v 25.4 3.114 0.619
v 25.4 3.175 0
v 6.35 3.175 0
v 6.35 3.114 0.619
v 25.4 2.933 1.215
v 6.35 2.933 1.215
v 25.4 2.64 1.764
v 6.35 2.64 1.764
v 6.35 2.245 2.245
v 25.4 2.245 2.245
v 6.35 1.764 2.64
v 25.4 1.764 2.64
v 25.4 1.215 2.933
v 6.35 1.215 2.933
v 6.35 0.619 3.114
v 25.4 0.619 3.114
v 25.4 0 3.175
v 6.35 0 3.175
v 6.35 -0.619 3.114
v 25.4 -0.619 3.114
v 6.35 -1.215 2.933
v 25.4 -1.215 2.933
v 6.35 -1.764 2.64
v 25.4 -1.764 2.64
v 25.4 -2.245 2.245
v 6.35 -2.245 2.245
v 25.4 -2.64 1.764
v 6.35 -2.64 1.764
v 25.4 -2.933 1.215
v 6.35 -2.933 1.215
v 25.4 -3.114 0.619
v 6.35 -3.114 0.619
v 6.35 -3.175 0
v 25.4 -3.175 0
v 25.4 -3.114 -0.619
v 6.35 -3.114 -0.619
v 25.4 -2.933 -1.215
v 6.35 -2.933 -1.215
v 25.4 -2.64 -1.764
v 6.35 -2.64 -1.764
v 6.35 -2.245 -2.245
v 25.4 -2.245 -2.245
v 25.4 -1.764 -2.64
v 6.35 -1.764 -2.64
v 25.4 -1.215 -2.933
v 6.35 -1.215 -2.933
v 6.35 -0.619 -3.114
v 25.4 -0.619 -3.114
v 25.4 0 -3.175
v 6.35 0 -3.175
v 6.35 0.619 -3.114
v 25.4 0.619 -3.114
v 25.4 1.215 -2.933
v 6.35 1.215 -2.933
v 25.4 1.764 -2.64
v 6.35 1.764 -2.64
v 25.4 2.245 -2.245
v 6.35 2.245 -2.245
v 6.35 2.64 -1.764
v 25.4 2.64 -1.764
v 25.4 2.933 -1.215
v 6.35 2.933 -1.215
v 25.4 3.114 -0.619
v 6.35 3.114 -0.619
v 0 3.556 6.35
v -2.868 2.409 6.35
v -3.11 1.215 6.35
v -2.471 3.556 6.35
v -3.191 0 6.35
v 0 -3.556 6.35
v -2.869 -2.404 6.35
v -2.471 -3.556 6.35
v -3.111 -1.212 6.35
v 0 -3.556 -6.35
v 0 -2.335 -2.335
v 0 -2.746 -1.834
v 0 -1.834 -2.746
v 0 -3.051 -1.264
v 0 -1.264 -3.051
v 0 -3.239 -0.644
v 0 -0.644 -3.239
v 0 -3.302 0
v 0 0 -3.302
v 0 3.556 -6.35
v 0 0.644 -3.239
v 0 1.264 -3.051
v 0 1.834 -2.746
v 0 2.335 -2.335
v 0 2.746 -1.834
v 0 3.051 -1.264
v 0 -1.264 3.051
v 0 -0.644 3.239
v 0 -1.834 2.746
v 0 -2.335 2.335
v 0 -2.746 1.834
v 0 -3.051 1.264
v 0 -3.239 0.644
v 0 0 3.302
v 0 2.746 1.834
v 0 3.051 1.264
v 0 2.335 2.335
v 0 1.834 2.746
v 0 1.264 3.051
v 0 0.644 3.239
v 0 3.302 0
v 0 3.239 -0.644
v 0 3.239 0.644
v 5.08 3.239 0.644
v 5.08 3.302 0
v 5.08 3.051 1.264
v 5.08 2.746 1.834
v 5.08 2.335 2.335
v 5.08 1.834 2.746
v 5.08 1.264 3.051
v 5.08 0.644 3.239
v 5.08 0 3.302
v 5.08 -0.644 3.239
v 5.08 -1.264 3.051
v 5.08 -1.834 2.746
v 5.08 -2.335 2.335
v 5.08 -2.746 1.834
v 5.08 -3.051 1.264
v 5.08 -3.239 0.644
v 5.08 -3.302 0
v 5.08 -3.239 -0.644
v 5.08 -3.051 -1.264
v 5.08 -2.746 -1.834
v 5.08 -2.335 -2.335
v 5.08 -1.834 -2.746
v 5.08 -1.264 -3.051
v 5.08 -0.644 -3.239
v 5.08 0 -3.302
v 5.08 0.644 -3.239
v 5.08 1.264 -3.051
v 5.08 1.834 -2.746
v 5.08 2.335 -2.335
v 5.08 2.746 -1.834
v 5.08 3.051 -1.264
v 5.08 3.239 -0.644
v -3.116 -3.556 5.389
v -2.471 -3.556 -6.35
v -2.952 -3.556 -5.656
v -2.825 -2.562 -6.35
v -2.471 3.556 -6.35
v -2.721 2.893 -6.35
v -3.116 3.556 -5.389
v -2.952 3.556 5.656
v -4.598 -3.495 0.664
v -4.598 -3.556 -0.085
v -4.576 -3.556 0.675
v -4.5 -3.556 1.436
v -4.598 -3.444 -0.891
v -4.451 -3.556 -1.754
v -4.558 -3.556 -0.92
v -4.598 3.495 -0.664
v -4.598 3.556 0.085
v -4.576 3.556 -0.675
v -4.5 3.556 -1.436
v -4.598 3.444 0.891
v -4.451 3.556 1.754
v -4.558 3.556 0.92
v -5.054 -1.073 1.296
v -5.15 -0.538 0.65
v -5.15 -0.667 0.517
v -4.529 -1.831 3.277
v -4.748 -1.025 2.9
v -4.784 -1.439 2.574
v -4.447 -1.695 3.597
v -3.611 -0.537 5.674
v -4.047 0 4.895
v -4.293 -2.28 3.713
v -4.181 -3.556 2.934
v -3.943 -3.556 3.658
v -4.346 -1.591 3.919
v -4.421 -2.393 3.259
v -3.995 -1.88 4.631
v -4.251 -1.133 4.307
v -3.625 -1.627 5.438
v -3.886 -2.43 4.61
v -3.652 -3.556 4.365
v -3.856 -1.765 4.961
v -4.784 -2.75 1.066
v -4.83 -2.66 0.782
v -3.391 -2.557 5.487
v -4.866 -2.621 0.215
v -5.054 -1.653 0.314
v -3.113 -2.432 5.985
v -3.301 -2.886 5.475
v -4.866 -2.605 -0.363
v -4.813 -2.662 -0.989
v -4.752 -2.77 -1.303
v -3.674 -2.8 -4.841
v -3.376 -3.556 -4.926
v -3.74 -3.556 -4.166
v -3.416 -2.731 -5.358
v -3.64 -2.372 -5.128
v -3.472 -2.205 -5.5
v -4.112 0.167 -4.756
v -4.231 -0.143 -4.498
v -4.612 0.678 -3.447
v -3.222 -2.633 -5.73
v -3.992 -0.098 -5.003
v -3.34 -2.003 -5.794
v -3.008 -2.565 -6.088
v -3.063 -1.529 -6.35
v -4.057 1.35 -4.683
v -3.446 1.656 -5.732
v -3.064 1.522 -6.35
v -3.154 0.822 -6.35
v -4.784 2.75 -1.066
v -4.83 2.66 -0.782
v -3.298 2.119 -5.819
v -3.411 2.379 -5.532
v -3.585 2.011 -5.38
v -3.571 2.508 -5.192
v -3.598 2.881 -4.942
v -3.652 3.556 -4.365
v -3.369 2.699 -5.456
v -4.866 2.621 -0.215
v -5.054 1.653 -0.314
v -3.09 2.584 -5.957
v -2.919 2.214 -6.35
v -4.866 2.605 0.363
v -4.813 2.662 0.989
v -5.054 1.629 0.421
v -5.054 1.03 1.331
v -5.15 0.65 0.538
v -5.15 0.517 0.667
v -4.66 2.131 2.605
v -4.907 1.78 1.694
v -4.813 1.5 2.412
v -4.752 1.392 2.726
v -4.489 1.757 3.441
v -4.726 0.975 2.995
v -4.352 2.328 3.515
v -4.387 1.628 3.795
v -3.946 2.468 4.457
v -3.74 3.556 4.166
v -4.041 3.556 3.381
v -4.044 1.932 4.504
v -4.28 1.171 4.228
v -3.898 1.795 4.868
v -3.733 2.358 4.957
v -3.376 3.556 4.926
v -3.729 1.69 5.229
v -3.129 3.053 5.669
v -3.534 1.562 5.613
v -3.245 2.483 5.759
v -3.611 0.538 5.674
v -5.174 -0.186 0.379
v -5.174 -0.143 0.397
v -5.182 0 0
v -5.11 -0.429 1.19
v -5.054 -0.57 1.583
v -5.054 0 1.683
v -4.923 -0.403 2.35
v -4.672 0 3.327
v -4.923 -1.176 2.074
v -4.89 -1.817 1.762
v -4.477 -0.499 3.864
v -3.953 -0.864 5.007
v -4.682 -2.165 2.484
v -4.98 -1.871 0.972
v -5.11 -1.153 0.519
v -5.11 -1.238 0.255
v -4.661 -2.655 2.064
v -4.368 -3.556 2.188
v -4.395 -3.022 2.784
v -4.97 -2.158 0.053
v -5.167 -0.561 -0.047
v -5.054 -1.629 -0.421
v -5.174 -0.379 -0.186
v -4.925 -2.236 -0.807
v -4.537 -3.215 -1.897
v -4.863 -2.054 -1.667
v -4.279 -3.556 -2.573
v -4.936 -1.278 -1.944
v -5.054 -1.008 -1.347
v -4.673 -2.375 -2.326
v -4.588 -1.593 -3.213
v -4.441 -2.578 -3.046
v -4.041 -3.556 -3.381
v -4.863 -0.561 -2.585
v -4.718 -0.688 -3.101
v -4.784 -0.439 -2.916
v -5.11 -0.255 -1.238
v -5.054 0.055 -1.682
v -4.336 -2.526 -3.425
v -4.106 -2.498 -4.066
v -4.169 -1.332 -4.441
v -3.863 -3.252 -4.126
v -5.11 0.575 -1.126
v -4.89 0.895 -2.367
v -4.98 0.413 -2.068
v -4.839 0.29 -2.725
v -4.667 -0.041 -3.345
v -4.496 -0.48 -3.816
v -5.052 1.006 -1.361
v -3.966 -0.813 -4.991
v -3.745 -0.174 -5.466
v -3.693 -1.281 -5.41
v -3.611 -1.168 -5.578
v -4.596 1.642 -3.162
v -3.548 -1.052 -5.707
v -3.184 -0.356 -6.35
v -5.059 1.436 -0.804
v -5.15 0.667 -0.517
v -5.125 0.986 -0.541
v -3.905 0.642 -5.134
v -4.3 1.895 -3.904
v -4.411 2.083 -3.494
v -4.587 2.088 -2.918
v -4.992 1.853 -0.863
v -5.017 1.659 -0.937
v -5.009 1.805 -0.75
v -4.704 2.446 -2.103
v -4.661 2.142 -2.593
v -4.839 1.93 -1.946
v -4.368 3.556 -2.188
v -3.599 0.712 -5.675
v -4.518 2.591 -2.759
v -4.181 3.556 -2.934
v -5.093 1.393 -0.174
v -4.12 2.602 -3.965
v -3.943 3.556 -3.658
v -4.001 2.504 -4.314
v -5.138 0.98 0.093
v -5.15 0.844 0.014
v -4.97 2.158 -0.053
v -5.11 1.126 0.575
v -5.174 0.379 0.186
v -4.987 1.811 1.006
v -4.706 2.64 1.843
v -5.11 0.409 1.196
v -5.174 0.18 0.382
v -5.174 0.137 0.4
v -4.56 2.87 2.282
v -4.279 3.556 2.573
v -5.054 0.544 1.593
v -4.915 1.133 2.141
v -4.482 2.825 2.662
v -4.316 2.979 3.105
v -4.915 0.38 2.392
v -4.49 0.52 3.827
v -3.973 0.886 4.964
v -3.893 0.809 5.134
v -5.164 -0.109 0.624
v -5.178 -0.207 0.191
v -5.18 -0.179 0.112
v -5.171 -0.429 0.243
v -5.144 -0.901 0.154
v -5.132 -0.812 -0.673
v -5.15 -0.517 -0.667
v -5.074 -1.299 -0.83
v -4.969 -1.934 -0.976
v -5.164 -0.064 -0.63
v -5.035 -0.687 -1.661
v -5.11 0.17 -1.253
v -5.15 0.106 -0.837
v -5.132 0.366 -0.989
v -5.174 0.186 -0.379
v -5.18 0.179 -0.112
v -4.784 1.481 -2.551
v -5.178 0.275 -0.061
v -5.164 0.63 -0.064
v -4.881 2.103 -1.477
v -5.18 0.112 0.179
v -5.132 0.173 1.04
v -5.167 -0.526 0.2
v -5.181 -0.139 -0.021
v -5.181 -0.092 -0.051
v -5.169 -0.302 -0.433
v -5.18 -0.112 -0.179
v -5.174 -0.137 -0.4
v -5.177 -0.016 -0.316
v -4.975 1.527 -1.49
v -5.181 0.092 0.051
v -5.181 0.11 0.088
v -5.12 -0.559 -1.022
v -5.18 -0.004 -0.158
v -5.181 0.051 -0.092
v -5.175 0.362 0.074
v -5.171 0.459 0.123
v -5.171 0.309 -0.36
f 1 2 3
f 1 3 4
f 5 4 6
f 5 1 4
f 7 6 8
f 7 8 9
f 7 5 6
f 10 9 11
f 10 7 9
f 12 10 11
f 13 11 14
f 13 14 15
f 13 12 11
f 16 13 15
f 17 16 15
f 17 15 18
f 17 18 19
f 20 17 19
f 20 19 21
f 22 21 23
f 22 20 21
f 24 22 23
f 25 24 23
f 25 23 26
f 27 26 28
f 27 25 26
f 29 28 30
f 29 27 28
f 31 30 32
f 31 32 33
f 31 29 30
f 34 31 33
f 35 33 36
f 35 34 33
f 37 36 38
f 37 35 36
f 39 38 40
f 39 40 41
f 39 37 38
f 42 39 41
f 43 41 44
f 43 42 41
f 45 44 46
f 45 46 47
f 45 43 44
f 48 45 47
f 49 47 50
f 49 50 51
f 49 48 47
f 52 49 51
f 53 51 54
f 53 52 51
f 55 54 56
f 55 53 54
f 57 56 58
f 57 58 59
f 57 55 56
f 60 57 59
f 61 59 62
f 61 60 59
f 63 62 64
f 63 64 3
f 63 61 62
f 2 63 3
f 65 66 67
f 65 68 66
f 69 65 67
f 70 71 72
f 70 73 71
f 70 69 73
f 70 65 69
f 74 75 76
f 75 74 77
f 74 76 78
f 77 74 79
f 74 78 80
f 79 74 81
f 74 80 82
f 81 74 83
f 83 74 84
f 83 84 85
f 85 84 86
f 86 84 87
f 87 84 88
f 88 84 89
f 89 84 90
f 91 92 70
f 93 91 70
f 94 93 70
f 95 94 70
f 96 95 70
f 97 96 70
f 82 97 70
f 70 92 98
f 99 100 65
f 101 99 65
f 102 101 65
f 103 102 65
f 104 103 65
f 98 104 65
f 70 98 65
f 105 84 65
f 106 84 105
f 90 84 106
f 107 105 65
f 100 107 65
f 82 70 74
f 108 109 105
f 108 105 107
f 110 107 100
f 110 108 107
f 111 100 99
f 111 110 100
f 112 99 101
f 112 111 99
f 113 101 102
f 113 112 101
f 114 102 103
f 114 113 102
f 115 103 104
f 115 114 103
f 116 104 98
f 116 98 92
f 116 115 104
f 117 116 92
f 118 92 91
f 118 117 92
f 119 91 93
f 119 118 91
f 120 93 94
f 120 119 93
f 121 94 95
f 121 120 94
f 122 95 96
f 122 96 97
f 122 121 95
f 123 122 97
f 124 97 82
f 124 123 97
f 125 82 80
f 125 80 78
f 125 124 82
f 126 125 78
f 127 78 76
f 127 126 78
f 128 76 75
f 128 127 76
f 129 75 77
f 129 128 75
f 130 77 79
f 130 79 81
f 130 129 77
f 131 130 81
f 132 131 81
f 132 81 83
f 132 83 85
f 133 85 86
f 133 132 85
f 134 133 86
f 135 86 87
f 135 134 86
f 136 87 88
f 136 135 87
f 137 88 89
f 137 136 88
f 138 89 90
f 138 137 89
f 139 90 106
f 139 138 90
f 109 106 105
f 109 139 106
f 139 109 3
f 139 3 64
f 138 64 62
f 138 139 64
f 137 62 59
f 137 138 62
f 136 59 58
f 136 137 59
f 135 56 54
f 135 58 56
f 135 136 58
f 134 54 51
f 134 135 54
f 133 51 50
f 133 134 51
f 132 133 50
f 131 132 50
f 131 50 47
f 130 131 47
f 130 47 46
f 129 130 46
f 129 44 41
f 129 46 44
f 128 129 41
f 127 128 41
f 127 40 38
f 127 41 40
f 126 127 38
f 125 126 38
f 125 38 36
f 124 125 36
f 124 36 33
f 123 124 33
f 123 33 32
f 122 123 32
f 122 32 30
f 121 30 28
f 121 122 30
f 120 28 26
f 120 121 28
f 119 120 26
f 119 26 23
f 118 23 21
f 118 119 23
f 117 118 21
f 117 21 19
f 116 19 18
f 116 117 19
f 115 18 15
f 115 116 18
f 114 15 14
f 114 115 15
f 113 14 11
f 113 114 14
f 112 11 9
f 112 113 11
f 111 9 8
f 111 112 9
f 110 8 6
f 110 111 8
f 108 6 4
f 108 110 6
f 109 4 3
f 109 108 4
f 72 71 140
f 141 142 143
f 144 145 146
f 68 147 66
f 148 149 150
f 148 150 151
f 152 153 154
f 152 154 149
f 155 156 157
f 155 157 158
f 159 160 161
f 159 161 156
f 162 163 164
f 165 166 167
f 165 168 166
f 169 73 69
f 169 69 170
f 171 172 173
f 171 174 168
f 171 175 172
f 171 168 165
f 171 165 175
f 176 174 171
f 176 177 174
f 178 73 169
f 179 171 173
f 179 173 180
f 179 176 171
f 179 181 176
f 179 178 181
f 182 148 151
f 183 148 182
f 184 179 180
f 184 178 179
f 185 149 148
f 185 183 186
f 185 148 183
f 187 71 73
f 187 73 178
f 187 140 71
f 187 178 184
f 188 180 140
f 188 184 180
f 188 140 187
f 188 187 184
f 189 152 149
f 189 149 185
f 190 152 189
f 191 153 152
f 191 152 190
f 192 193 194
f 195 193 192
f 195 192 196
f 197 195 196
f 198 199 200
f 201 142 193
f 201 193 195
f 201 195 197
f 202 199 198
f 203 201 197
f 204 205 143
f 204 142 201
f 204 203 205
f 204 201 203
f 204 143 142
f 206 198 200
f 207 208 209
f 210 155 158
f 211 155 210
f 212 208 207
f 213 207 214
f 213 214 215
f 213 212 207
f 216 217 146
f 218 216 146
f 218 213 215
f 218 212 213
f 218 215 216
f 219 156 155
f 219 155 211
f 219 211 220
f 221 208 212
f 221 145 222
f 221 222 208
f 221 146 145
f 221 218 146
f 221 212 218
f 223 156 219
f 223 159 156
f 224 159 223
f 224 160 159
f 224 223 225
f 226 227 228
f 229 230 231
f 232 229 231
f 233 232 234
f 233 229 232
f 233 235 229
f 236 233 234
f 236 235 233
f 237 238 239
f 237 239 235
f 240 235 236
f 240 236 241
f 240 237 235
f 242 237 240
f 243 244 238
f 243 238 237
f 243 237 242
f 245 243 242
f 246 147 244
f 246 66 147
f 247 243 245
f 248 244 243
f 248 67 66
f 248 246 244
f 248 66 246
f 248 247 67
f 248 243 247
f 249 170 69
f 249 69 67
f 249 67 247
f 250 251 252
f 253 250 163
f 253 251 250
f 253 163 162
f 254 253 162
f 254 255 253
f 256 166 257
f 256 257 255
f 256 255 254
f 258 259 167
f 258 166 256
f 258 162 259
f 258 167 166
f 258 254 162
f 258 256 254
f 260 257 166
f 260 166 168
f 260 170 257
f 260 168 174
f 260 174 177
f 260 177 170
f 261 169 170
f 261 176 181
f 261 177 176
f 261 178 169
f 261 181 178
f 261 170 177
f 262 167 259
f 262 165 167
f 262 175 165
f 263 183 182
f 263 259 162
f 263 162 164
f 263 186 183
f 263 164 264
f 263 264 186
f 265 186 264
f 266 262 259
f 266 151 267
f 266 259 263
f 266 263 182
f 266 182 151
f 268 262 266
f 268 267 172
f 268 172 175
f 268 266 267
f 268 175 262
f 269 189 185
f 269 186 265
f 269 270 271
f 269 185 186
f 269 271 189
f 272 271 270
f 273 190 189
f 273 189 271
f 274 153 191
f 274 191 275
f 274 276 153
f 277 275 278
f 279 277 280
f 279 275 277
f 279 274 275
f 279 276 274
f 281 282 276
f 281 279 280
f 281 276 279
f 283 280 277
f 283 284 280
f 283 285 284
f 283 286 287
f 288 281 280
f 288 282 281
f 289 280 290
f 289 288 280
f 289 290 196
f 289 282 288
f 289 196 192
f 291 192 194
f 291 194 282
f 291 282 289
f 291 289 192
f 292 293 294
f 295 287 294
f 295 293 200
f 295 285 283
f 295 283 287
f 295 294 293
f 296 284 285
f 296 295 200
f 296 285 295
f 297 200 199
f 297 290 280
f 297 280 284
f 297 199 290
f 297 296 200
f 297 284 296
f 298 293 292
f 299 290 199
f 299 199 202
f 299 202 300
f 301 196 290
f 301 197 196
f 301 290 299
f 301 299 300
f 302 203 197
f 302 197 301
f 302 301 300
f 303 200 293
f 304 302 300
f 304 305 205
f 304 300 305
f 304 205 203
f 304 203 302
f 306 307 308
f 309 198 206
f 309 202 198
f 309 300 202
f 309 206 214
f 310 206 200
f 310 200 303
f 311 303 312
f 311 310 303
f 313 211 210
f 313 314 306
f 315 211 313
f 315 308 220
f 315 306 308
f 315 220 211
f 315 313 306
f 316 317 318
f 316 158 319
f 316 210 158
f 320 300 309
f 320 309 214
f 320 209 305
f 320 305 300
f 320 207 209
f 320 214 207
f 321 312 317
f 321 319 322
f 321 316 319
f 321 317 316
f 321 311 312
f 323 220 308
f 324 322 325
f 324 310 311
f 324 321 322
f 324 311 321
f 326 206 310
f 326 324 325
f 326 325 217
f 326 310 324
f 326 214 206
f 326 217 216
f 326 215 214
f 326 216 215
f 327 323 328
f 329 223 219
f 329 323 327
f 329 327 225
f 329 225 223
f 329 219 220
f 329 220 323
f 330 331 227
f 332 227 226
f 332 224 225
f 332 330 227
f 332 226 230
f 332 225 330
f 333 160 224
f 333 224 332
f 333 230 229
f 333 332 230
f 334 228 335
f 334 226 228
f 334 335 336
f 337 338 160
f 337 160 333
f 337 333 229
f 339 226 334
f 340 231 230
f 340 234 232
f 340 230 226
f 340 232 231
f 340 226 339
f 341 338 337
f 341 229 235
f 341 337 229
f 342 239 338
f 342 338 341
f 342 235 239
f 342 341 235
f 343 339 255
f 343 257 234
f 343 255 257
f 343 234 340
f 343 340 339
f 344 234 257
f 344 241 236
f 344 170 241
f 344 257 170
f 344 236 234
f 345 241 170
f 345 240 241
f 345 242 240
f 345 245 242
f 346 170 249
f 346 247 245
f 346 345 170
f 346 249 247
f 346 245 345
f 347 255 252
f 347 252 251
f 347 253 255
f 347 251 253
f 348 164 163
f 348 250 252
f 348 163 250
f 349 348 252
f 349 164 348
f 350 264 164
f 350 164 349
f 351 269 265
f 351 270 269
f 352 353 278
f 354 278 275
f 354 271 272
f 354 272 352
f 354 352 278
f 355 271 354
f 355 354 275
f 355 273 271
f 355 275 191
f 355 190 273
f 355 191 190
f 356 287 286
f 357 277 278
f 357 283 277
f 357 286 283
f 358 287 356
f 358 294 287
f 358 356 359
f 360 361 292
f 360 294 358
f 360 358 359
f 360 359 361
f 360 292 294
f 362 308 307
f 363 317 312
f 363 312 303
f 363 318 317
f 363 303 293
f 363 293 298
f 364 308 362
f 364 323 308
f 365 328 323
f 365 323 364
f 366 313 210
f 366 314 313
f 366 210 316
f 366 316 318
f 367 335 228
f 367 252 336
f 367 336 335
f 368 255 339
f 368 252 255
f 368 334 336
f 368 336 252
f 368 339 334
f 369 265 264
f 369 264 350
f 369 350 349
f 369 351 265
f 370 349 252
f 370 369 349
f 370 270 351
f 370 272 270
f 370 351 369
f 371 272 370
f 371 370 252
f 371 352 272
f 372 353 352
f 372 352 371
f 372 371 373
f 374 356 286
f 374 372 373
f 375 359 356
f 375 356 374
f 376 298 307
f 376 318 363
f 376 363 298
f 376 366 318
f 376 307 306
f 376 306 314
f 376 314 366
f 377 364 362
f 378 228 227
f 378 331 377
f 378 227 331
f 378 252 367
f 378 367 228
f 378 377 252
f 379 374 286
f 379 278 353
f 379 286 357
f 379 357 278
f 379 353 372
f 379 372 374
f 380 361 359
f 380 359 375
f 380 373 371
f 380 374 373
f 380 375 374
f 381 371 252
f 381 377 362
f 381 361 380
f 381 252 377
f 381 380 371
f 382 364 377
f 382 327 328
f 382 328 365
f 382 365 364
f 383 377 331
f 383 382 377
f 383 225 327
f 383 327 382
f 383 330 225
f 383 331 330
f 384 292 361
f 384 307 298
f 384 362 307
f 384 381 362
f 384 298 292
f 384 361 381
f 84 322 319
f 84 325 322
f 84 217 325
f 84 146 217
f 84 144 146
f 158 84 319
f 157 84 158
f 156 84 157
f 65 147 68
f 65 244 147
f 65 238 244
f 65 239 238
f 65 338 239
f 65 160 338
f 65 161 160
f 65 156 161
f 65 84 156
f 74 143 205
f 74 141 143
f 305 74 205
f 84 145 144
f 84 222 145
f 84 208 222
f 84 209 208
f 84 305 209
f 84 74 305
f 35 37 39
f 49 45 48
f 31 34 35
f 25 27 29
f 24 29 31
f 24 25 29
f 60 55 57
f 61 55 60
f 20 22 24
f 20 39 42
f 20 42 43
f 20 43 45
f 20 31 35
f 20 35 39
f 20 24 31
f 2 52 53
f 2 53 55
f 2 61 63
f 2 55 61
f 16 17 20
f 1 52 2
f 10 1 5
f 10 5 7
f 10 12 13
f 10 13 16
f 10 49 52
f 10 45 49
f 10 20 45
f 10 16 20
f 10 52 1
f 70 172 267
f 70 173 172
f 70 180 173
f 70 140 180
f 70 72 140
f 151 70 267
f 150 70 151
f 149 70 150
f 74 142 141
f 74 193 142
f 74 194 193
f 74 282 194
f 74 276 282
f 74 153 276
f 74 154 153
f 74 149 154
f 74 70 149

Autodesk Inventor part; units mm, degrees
ref_plane "YZ Plane" through (0, 0, 0) normal (1, 0, 0) x (0, 1, 0)
sketch "Boceto1" plane through (0, 0, 0) normal (0, 0, 1) x (1, 0, 0)
  line L0 (0, 3.302) -> (5.08, 3.302)
  line L1 (5.08, 3.302) -> (6.35, 3.175)
  line L2 (6.35, 3.175) -> (25.4, 3.175)
  line L3 (25.4, 3.175) -> (25.4, 2.4879)
  line L4 (25.4, 2.4879) -> (25.4, 0)
  line L5 (0, 3.9624) -> (0, -0.6604) projected
  line L6 (0, 3.302) -> (0, 0)
  line L7 (-0.4343, 0) -> (7.5114, 0)
  line L8 (-5.6012, 0) -> (30.5669, 0) projected
  line L9 (0, 0) -> (25.4, 0)
  dimension "d0" = 0
  dimension "d1" = 19.05
  dimension "d2" = 1.27
  dimension "d3" = 4.9759
  dimension "d4" = 6.35
  dimension "d5" = 6.604
  dimension "d6" = 25.4
revolve "Cuerpo" add sketch "Boceto1" angle 360 about axis through (-0.4343, 0, 0) along (1, 0, 0)
sketch "Boceto2" plane through (0, 0, 0) normal (-1, 0, 0) x (0, 0, 1)
  line L0 (-6.35, 3.556) -> (6.35, 3.556)
  line L1 (6.35, 3.556) -> (6.35, -3.556)
  line L2 (6.35, -3.556) -> (-6.35, -3.556)
  line L3 (-6.35, -3.556) -> (-6.35, 3.556)
  line L4 (-8.89, 0) -> (8.89, 0) projected
  line L5 (0, 4.9784) -> (0, -4.9784) projected
  dimension "d7" = 3.556
  dimension "d8" = 7.112
  dimension "d9" = 6.35
  dimension "d10" = 12.7
extrude "Cabeza" add sketch "Boceto2" along normal blind 5.1816
ref_plane "IDS_WORKPLANE{1}" through (0, 0, 0) normal (0, 1, 0) x (-1, 0, 0)
sketch "Boceto3" plane through (0, 0, 0) normal (0, 1, 0) x (-1, 0, 0)
  arc A0 (5.1816, 0) -> (-0.1952, 9.525) centre (-5.9436, 0) ccw
  line L0 (0, -9.6663) -> (0, 13.5477) projected
  line L1 (8.9083, 0) -> (-8.4189, 0) projected
  line L2 (5.1816, 6.35) -> (5.1816, 9.525)
  line L3 (5.1816, 9.525) -> (-0.1952, 9.525)
  line L4 (5.1816, 6.35) -> (5.1816, -6.35) projected
  dimension "d15" = 11.1252
  dimension "d19" = 19.05
revolve "Empalme1" cut sketch "Boceto3" angle 360 about axis through (-10, 0, 0) along (1, 0, 0) contours A0 L0 L3 L2 L4 | A0 L3 L0
thread "Rosca" size "1/4-20 UNC" class "2A" standard "ANSI Unified Screw Threads" full length
ref_plane "Work Plane3" through (15.875, 0, 0) normal (0, 0, -1) x (1, 0, 0)
equation "\"d7\" = 0.5 * KBR"
equation "\"d8\" = KBR"
equation "\"d9\" = 0.5 * KOL"
equation "\"d10\" = KOL"
equation "\"d11\" = KOH"
equation "\"d15\" = KR"
equation "\"d19\" = 1.5 * KOL"
equation "\"d1\" = GEL"
equation "\"d2\" = GAL"
equation "\"d3\" = SPD"
equation "\"d4\" = GD"
equation "\"d5\" = BDM"
equation "\"d6\" = NLG"
equation "\"GD\" = NND"
equation "\"NLG\" = 25.4"
equation "\"GAL\" = 1.27"
equation "\"GEL\" = 19.05"
equation "\"BDM\" = 6.604"
equation "\"KOL\" = 12.7"
equation "\"KBR\" = 7.112"
equation "\"KOH\" = 5.1816"
equation "\"KR\" = 11.1252"
equation "\"SPD\" = GD1"
equation "\"RR\" = -0.5 * BDM + 0.5 * KBR"
equation "\"d13\" = 0.5 * KOL"
equation "\"GUL\" = 0"
equation "\"PHH\" = 0.15 * KOH"
equation "\"THREADDIA\" = 6.35"
equation "\"TOA\" = 30deg"
equation "\"NND\" = 6.35"
equation "\"GD1\" = 4.97586"
properties part number "ANSI/ASME B18.5 - 1/4 - 20 - 1" material "Acero, suave"
